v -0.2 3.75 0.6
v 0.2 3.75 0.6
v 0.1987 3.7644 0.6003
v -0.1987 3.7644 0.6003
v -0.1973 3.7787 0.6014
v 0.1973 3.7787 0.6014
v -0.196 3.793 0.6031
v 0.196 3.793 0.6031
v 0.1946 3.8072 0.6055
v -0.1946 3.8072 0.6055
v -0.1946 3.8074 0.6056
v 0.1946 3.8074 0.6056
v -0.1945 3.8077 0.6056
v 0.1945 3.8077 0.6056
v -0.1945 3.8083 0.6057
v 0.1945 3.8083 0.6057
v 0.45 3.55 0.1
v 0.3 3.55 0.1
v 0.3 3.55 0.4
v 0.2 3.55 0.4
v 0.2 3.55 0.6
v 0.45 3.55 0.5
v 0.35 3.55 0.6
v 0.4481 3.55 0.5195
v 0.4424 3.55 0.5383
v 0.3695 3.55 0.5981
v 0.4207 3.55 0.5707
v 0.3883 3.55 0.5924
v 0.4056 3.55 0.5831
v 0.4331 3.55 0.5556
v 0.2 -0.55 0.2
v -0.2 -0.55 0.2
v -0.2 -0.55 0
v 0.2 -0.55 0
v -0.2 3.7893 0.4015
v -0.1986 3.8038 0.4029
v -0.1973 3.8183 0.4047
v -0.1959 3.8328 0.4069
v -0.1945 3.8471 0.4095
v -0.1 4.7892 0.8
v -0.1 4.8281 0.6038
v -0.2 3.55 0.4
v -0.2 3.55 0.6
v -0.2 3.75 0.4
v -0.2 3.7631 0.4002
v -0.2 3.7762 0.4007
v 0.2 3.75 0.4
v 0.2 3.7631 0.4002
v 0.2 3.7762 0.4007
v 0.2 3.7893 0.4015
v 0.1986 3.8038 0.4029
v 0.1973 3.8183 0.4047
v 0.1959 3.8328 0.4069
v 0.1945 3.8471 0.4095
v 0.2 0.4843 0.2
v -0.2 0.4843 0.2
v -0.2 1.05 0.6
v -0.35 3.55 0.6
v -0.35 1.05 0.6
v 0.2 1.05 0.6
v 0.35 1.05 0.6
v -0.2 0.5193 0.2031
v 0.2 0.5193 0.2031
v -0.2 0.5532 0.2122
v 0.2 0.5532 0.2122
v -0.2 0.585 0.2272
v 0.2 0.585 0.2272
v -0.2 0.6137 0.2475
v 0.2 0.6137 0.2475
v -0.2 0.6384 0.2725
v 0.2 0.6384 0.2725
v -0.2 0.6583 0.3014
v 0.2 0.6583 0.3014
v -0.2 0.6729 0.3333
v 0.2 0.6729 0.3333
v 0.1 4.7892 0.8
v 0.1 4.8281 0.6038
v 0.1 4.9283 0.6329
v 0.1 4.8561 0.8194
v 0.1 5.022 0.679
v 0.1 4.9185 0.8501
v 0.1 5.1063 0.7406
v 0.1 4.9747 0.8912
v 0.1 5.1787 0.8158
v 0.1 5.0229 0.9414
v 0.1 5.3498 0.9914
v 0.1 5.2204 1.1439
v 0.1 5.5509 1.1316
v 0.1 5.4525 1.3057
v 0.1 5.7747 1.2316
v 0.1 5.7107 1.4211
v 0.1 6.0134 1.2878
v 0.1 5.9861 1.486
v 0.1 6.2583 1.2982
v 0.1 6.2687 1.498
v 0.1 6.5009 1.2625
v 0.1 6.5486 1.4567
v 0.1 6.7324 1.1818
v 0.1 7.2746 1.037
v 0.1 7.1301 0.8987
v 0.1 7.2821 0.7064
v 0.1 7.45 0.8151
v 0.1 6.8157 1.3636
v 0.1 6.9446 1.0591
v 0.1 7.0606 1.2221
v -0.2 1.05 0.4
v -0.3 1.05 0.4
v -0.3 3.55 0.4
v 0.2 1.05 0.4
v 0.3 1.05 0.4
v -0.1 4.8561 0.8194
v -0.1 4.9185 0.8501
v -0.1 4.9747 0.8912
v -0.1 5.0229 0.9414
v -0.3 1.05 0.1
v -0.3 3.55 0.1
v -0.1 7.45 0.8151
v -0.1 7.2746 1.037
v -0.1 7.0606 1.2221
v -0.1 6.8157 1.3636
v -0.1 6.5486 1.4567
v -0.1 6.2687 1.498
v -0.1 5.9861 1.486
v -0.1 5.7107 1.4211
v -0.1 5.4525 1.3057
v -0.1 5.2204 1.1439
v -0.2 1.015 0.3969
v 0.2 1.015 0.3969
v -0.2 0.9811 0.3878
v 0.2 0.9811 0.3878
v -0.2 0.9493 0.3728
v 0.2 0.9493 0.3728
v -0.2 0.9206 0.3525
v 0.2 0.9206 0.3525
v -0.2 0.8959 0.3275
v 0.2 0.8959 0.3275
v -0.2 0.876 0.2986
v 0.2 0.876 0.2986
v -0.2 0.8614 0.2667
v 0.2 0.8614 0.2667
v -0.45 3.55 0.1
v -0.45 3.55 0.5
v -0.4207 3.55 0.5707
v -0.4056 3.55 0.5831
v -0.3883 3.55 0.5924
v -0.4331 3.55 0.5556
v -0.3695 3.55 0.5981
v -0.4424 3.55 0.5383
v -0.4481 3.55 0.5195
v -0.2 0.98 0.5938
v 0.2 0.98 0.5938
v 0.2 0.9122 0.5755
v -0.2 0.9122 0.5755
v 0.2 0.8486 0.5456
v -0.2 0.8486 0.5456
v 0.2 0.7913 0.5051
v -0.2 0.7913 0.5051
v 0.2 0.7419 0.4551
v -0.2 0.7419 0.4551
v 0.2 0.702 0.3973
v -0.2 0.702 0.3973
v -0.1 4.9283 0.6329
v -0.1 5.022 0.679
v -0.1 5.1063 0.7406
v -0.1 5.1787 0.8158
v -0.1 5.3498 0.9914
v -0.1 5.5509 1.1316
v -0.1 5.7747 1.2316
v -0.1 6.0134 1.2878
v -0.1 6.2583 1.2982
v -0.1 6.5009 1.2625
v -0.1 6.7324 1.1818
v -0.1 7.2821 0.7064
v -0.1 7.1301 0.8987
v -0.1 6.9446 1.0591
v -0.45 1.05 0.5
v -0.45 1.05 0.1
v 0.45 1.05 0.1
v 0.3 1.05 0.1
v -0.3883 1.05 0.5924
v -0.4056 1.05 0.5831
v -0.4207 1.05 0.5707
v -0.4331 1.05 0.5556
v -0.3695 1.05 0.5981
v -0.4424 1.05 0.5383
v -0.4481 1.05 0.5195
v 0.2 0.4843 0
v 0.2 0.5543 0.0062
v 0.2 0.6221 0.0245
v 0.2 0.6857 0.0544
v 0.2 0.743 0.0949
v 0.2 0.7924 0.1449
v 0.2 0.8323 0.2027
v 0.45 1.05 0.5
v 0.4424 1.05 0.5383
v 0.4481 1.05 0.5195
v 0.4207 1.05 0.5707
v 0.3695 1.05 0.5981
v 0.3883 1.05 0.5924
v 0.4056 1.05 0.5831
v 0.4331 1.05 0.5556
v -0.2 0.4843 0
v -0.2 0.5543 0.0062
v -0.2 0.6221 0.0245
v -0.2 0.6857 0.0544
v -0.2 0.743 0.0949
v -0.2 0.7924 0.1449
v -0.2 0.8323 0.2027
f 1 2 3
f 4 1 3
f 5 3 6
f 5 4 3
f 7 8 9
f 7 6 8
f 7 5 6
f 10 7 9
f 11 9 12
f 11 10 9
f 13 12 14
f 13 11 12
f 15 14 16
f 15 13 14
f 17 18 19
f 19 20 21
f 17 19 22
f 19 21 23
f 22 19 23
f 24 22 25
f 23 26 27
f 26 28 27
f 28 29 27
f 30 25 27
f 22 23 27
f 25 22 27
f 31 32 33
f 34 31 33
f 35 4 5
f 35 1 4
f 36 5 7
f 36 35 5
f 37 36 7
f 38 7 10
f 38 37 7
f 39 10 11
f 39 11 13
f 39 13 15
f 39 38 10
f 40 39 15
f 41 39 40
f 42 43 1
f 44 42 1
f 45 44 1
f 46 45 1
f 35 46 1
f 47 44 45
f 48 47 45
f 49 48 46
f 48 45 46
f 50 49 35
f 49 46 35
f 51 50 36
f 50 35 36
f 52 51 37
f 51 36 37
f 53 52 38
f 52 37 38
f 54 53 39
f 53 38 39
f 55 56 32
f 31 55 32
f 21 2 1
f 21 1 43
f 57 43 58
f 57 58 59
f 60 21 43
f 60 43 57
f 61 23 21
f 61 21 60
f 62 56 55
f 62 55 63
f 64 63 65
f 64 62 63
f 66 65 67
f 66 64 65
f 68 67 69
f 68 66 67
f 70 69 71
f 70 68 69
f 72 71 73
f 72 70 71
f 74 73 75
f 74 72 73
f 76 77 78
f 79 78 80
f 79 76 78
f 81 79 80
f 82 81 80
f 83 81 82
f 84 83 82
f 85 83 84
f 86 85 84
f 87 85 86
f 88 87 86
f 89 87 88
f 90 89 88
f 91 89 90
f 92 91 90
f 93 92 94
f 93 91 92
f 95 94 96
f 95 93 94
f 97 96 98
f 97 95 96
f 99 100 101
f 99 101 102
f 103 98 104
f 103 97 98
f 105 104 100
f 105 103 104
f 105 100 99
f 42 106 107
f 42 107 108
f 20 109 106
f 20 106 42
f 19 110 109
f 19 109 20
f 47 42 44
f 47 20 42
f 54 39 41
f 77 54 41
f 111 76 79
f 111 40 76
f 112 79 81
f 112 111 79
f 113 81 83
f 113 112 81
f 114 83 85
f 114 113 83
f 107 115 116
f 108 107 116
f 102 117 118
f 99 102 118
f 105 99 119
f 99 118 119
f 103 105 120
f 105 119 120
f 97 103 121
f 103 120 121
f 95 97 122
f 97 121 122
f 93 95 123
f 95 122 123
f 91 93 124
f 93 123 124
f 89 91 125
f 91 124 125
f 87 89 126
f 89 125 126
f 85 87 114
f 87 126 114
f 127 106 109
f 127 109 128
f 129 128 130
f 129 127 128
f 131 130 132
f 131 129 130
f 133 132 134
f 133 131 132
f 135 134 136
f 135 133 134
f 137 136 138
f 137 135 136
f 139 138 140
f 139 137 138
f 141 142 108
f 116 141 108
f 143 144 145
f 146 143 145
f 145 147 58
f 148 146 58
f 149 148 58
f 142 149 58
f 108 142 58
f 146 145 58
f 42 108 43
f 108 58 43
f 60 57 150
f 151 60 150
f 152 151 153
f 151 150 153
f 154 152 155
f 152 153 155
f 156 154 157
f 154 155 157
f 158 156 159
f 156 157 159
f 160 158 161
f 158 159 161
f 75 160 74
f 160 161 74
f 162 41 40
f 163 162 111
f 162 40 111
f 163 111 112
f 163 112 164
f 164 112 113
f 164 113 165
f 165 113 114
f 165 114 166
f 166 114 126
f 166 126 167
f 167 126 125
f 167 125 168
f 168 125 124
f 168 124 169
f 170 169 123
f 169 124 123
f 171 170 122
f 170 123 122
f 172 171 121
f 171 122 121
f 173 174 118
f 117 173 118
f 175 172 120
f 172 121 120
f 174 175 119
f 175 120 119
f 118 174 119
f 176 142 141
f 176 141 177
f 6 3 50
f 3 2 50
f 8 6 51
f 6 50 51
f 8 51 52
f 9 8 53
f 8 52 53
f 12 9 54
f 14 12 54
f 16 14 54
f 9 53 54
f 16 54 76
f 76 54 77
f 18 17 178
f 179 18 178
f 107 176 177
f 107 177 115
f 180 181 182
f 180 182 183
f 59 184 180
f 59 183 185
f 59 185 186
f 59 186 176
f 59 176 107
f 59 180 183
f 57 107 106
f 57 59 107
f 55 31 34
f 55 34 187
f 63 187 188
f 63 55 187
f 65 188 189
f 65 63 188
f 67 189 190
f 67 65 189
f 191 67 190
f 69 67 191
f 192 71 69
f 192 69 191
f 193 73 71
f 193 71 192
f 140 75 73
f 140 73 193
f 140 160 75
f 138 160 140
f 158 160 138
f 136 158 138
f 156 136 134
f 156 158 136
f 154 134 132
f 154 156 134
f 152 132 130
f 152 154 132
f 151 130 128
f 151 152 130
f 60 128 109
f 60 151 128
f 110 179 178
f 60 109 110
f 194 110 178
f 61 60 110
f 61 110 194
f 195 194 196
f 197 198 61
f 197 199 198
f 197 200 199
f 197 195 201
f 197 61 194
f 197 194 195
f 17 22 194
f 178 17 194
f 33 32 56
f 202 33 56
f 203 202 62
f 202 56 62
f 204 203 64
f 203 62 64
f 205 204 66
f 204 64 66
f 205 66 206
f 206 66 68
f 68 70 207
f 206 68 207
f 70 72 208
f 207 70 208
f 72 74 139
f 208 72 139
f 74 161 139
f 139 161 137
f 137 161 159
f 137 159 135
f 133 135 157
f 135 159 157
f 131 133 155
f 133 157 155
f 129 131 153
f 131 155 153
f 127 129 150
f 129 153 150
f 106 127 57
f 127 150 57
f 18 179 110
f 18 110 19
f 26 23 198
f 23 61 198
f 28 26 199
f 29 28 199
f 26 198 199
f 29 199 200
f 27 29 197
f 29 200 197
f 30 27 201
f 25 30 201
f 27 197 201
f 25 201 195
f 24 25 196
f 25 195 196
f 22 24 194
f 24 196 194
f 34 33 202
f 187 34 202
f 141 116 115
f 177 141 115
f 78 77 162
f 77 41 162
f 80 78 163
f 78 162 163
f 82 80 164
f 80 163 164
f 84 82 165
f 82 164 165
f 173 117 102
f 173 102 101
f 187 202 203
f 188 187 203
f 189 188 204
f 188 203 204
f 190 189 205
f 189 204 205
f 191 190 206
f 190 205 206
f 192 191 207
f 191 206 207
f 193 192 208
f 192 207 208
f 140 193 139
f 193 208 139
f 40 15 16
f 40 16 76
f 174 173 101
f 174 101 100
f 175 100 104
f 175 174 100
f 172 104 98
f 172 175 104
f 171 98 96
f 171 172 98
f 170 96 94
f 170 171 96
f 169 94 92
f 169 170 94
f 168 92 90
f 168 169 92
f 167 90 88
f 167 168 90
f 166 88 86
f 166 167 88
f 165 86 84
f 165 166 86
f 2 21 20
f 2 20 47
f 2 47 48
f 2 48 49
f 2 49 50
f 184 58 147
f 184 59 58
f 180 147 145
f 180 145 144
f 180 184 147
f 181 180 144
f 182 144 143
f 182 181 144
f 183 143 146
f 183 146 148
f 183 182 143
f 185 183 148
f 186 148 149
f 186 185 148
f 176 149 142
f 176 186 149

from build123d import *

# Parameters (mm, degrees)
PAD_DEPTH         = 0.4
POCKET_DEPTH      = 1.3027
POCKET_DEPTH_BACK = -1.724987
SKETCH002_W       = 2.5
SKETCH002_H       = 0.9
PAD001_DEPTH      = 0.5
SKETCH003_W       = 2.5
SKETCH003_H       = 0.6
POCKET001_DEPTH   = 0.3
FILLET_R          = 0.1


with BuildPart() as part:
    # Sketch → Pad (new body)
    with BuildSketch(Plane.YZ):
        with BuildLine():
            Line((-0.55, 0), (0.484315, 0))
            ThreePointArc((0.484315, 0), (0.715251, 0.073399), (0.861435, 0.266658))
            Line((0.86144, 0.266671), (0.861435, 0.266658))
            ThreePointArc((1.05, 0.4), (0.934532, 0.363301), (0.86144, 0.266671))
            Line((1.05, 0.4), (3.75, 0.4))
            ThreePointArc((3.75, 0.4), (3.798804, 0.402388), (3.847142, 0.409527))
            Line((3.847142, 0.409527), (4.828087, 0.603811))
            ThreePointArc((4.828087, 0.603811), (5.022026, 0.678974), (5.17865, 0.815833))
            ThreePointArc((7.282105, 0.706415), (6.258318, 1.298245), (5.17865, 0.815833))
            Line((7.45, 0.815094), (7.282105, 0.706415))
            ThreePointArc((7.45, 0.815094), (6.268711, 1.497974), (5.022942, 0.941351))
            ThreePointArc((4.78923, 0.8), (4.918525, 0.85011), (5.022942, 0.941351))
            Line((3.808285, 0.605716), (4.78923, 0.8))
            ThreePointArc((3.75, 0.6), (3.779282, 0.601433), (3.808285, 0.605716))
            Line((1.05, 0.6), (3.75, 0.6))
            ThreePointArc((1.05, 0.6), (0.81906, 0.526599), (0.672876, 0.333333))
            ThreePointArc((0.484311, 0.2), (0.599783, 0.2367), (0.672876, 0.333333))
            Line((0.484311, 0.2), (-0.55, 0.2))
            Line((-0.55, 0.2), (-0.55, 0))
        make_face()
    extrude(amount=PAD_DEPTH)

    # Sketch001 (on Face15 of Pad) → Pocket (cut, two sides)
    with BuildSketch(Plane(origin=(0, 0.02831, -0.142936), x_dir=(0, -0.980945, -0.194284), z_dir=(0, -0.194284, 0.980945))) as pocket_sk:
        Polygon((-3.795115, 0.4), (-4.853401, 0.3), (-7.466403, 0.3), (-7.466403, 0.4), align=None)
        Polygon((-3.795115, 0), (-4.853401, 0.1), (-7.466403, 0.1), (-7.466403, 0), align=None)
    extrude(amount=-POCKET_DEPTH, mode=Mode.SUBTRACT)
    extrude(pocket_sk.sketch, amount=-POCKET_DEPTH_BACK, mode=Mode.SUBTRACT)

    # Sketch002 (on Face14 of Pocket) → Pad001 (join)
    with BuildSketch(Plane(origin=(0, 0, 0.6), x_dir=(0, -1, 0), z_dir=(0, 0, 1))):
        with Locations((-2.3, 0.2)):
            Rectangle(SKETCH002_W, SKETCH002_H)
    extrude(amount=-PAD001_DEPTH)

    # Sketch003 (on Face16 of Pad001) → Pocket001 (cut)
    with BuildSketch(Plane.YX.offset(-0.1)):
        with Locations((2.3, 0.2)):
            Rectangle(SKETCH003_W, SKETCH003_H)
    extrude(amount=-POCKET001_DEPTH, mode=Mode.SUBTRACT)

    # Fillet
    fillet_edges = [part.edges().sort_by_distance(p)[0] for p in [
        (0.65, 2.3, 0.6),
        (-0.25, 2.3, 0.6),
    ]]
    fillet(fillet_edges, radius=FILLET_R)


with BuildPart() as part_1:
    # Body placement: moved
    add(part.part.moved(Location((-0.2, 0, 0))))


solid = part_1.part
